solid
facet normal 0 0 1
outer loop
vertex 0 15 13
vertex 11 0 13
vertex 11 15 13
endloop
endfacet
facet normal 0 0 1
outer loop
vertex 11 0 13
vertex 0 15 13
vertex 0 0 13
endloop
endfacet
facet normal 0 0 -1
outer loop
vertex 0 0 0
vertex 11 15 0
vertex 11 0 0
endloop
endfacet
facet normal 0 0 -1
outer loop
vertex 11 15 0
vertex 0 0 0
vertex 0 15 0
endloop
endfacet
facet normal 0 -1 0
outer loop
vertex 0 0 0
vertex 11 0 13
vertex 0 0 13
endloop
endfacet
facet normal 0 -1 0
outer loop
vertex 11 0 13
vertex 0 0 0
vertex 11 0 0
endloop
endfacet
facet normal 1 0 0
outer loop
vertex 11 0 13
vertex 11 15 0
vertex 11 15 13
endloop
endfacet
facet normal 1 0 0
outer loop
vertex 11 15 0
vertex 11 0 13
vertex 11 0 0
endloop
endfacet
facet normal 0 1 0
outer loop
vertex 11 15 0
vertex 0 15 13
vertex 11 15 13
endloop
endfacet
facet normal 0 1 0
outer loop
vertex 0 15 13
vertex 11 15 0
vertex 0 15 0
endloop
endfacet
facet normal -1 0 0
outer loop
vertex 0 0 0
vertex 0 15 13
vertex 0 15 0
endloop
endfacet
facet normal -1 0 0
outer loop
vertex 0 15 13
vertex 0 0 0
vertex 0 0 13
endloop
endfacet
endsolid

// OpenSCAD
// Generated by SolidPython 1.0.1 on 2020-07-29 00:46:55


cube(size = [11, 15, 13]);
/***********************************************
*********      SolidPython code:      **********
************************************************
 
# import packages: SolidPython
from solid import *
from solid.utils import *
from itertools import chain, combinations, permutations


class Resize:

    def __init__(self, scad_file):
        self.scad_file = scad_file
        #self.scad_file = import_scad(scad_file)
        # cone/cylinder param:
        self.r1 = 0
        self.r2 = 0
        self.h = 0
        # rectangular prism param:
        self.w = 0
        self.l = 0
        # ellipse param:
        self.r = 0

    # import OpenScad code (file name corresponds to shape)


    # classify shape + parameters
    def assign(self, param1, param2, param3):
        if self.scad_file == 'cone.scad':
            self.r1 = param1
            self.r2 = param2
            self.h = param3
        elif self.scad_file == 'cylinder.scad':
            self.r1 = param1
            self.r2 = param2
            self.h = param3
        elif self.scad_file == 'rectangularPrism.scad':
            self.h = param1
            self.l = param2
            self.w = param3
        else:
            self.r = param1
            self.h = param2

    # resize parameters
    def iterate(self):
        x = range(3, 20, 2)
        i = 1
        if self.scad_file == 'cone.scad':
            tempList = list(permutations(x, 2))
            for temp in tempList:
                param1 = temp[0]
                param2 = temp[1]
                filepath = 'produced_scad_files/' + 'cone' + str(param1) + '_' + str(param2) + '_' + '.scad'
                scad_render_to_file(cylinder(h=param1, r1=param2, r2=0), filepath)

        elif self.scad_file == 'cylinder.scad':
            tempList = list(permutations(x, 3))
            for temp in tempList:
                param1 = temp[0]
                param2 = temp[1]
                filepath = 'produced_scad_files/' + 'cylinder' + str(param1) + '_' + str(param2) + '_' + '.scad'
                scad_render_to_file(cylinder(h=param1, r1=param2, r2=param2), filepath)

        elif self.scad_file == 'rectangularPrism.scad':
            tempList = list(permutations(x, 3))
            for temp in tempList:
                param1 = temp[0]
                param2 = temp[1]
                param3 = temp[2]
                filepath = 'produced_scad_files/' + 'rectangularPrism' + str(param1) + '_' + str(param2) + '_' + str(
                    param3) + '.scad'
                scad_render_to_file(cube(size=(param1, param2, param3)), filepath)

        elif self.scad_file == 'ellipse.scad':
            tempList = list(permutations(x, 4))
            for temp in tempList:
                param1 = temp[0]
                param2 = temp[1]
                param3 = temp[2]
                param4 = temp[3]
                filepath = 'produced_scad_files/' + 'ellipse' + str(param1) + '_' + str(param2) + '_' + str(param3) + '_' + str(param4) + '.scad'
                scad_render_to_file(scale([param1, param2, param3])(sphere(r=param4)), filepath)

    def render_to_scadfile(self):
        scad_render_to_file(scad, 'example.scad') 
 
************************************************/
